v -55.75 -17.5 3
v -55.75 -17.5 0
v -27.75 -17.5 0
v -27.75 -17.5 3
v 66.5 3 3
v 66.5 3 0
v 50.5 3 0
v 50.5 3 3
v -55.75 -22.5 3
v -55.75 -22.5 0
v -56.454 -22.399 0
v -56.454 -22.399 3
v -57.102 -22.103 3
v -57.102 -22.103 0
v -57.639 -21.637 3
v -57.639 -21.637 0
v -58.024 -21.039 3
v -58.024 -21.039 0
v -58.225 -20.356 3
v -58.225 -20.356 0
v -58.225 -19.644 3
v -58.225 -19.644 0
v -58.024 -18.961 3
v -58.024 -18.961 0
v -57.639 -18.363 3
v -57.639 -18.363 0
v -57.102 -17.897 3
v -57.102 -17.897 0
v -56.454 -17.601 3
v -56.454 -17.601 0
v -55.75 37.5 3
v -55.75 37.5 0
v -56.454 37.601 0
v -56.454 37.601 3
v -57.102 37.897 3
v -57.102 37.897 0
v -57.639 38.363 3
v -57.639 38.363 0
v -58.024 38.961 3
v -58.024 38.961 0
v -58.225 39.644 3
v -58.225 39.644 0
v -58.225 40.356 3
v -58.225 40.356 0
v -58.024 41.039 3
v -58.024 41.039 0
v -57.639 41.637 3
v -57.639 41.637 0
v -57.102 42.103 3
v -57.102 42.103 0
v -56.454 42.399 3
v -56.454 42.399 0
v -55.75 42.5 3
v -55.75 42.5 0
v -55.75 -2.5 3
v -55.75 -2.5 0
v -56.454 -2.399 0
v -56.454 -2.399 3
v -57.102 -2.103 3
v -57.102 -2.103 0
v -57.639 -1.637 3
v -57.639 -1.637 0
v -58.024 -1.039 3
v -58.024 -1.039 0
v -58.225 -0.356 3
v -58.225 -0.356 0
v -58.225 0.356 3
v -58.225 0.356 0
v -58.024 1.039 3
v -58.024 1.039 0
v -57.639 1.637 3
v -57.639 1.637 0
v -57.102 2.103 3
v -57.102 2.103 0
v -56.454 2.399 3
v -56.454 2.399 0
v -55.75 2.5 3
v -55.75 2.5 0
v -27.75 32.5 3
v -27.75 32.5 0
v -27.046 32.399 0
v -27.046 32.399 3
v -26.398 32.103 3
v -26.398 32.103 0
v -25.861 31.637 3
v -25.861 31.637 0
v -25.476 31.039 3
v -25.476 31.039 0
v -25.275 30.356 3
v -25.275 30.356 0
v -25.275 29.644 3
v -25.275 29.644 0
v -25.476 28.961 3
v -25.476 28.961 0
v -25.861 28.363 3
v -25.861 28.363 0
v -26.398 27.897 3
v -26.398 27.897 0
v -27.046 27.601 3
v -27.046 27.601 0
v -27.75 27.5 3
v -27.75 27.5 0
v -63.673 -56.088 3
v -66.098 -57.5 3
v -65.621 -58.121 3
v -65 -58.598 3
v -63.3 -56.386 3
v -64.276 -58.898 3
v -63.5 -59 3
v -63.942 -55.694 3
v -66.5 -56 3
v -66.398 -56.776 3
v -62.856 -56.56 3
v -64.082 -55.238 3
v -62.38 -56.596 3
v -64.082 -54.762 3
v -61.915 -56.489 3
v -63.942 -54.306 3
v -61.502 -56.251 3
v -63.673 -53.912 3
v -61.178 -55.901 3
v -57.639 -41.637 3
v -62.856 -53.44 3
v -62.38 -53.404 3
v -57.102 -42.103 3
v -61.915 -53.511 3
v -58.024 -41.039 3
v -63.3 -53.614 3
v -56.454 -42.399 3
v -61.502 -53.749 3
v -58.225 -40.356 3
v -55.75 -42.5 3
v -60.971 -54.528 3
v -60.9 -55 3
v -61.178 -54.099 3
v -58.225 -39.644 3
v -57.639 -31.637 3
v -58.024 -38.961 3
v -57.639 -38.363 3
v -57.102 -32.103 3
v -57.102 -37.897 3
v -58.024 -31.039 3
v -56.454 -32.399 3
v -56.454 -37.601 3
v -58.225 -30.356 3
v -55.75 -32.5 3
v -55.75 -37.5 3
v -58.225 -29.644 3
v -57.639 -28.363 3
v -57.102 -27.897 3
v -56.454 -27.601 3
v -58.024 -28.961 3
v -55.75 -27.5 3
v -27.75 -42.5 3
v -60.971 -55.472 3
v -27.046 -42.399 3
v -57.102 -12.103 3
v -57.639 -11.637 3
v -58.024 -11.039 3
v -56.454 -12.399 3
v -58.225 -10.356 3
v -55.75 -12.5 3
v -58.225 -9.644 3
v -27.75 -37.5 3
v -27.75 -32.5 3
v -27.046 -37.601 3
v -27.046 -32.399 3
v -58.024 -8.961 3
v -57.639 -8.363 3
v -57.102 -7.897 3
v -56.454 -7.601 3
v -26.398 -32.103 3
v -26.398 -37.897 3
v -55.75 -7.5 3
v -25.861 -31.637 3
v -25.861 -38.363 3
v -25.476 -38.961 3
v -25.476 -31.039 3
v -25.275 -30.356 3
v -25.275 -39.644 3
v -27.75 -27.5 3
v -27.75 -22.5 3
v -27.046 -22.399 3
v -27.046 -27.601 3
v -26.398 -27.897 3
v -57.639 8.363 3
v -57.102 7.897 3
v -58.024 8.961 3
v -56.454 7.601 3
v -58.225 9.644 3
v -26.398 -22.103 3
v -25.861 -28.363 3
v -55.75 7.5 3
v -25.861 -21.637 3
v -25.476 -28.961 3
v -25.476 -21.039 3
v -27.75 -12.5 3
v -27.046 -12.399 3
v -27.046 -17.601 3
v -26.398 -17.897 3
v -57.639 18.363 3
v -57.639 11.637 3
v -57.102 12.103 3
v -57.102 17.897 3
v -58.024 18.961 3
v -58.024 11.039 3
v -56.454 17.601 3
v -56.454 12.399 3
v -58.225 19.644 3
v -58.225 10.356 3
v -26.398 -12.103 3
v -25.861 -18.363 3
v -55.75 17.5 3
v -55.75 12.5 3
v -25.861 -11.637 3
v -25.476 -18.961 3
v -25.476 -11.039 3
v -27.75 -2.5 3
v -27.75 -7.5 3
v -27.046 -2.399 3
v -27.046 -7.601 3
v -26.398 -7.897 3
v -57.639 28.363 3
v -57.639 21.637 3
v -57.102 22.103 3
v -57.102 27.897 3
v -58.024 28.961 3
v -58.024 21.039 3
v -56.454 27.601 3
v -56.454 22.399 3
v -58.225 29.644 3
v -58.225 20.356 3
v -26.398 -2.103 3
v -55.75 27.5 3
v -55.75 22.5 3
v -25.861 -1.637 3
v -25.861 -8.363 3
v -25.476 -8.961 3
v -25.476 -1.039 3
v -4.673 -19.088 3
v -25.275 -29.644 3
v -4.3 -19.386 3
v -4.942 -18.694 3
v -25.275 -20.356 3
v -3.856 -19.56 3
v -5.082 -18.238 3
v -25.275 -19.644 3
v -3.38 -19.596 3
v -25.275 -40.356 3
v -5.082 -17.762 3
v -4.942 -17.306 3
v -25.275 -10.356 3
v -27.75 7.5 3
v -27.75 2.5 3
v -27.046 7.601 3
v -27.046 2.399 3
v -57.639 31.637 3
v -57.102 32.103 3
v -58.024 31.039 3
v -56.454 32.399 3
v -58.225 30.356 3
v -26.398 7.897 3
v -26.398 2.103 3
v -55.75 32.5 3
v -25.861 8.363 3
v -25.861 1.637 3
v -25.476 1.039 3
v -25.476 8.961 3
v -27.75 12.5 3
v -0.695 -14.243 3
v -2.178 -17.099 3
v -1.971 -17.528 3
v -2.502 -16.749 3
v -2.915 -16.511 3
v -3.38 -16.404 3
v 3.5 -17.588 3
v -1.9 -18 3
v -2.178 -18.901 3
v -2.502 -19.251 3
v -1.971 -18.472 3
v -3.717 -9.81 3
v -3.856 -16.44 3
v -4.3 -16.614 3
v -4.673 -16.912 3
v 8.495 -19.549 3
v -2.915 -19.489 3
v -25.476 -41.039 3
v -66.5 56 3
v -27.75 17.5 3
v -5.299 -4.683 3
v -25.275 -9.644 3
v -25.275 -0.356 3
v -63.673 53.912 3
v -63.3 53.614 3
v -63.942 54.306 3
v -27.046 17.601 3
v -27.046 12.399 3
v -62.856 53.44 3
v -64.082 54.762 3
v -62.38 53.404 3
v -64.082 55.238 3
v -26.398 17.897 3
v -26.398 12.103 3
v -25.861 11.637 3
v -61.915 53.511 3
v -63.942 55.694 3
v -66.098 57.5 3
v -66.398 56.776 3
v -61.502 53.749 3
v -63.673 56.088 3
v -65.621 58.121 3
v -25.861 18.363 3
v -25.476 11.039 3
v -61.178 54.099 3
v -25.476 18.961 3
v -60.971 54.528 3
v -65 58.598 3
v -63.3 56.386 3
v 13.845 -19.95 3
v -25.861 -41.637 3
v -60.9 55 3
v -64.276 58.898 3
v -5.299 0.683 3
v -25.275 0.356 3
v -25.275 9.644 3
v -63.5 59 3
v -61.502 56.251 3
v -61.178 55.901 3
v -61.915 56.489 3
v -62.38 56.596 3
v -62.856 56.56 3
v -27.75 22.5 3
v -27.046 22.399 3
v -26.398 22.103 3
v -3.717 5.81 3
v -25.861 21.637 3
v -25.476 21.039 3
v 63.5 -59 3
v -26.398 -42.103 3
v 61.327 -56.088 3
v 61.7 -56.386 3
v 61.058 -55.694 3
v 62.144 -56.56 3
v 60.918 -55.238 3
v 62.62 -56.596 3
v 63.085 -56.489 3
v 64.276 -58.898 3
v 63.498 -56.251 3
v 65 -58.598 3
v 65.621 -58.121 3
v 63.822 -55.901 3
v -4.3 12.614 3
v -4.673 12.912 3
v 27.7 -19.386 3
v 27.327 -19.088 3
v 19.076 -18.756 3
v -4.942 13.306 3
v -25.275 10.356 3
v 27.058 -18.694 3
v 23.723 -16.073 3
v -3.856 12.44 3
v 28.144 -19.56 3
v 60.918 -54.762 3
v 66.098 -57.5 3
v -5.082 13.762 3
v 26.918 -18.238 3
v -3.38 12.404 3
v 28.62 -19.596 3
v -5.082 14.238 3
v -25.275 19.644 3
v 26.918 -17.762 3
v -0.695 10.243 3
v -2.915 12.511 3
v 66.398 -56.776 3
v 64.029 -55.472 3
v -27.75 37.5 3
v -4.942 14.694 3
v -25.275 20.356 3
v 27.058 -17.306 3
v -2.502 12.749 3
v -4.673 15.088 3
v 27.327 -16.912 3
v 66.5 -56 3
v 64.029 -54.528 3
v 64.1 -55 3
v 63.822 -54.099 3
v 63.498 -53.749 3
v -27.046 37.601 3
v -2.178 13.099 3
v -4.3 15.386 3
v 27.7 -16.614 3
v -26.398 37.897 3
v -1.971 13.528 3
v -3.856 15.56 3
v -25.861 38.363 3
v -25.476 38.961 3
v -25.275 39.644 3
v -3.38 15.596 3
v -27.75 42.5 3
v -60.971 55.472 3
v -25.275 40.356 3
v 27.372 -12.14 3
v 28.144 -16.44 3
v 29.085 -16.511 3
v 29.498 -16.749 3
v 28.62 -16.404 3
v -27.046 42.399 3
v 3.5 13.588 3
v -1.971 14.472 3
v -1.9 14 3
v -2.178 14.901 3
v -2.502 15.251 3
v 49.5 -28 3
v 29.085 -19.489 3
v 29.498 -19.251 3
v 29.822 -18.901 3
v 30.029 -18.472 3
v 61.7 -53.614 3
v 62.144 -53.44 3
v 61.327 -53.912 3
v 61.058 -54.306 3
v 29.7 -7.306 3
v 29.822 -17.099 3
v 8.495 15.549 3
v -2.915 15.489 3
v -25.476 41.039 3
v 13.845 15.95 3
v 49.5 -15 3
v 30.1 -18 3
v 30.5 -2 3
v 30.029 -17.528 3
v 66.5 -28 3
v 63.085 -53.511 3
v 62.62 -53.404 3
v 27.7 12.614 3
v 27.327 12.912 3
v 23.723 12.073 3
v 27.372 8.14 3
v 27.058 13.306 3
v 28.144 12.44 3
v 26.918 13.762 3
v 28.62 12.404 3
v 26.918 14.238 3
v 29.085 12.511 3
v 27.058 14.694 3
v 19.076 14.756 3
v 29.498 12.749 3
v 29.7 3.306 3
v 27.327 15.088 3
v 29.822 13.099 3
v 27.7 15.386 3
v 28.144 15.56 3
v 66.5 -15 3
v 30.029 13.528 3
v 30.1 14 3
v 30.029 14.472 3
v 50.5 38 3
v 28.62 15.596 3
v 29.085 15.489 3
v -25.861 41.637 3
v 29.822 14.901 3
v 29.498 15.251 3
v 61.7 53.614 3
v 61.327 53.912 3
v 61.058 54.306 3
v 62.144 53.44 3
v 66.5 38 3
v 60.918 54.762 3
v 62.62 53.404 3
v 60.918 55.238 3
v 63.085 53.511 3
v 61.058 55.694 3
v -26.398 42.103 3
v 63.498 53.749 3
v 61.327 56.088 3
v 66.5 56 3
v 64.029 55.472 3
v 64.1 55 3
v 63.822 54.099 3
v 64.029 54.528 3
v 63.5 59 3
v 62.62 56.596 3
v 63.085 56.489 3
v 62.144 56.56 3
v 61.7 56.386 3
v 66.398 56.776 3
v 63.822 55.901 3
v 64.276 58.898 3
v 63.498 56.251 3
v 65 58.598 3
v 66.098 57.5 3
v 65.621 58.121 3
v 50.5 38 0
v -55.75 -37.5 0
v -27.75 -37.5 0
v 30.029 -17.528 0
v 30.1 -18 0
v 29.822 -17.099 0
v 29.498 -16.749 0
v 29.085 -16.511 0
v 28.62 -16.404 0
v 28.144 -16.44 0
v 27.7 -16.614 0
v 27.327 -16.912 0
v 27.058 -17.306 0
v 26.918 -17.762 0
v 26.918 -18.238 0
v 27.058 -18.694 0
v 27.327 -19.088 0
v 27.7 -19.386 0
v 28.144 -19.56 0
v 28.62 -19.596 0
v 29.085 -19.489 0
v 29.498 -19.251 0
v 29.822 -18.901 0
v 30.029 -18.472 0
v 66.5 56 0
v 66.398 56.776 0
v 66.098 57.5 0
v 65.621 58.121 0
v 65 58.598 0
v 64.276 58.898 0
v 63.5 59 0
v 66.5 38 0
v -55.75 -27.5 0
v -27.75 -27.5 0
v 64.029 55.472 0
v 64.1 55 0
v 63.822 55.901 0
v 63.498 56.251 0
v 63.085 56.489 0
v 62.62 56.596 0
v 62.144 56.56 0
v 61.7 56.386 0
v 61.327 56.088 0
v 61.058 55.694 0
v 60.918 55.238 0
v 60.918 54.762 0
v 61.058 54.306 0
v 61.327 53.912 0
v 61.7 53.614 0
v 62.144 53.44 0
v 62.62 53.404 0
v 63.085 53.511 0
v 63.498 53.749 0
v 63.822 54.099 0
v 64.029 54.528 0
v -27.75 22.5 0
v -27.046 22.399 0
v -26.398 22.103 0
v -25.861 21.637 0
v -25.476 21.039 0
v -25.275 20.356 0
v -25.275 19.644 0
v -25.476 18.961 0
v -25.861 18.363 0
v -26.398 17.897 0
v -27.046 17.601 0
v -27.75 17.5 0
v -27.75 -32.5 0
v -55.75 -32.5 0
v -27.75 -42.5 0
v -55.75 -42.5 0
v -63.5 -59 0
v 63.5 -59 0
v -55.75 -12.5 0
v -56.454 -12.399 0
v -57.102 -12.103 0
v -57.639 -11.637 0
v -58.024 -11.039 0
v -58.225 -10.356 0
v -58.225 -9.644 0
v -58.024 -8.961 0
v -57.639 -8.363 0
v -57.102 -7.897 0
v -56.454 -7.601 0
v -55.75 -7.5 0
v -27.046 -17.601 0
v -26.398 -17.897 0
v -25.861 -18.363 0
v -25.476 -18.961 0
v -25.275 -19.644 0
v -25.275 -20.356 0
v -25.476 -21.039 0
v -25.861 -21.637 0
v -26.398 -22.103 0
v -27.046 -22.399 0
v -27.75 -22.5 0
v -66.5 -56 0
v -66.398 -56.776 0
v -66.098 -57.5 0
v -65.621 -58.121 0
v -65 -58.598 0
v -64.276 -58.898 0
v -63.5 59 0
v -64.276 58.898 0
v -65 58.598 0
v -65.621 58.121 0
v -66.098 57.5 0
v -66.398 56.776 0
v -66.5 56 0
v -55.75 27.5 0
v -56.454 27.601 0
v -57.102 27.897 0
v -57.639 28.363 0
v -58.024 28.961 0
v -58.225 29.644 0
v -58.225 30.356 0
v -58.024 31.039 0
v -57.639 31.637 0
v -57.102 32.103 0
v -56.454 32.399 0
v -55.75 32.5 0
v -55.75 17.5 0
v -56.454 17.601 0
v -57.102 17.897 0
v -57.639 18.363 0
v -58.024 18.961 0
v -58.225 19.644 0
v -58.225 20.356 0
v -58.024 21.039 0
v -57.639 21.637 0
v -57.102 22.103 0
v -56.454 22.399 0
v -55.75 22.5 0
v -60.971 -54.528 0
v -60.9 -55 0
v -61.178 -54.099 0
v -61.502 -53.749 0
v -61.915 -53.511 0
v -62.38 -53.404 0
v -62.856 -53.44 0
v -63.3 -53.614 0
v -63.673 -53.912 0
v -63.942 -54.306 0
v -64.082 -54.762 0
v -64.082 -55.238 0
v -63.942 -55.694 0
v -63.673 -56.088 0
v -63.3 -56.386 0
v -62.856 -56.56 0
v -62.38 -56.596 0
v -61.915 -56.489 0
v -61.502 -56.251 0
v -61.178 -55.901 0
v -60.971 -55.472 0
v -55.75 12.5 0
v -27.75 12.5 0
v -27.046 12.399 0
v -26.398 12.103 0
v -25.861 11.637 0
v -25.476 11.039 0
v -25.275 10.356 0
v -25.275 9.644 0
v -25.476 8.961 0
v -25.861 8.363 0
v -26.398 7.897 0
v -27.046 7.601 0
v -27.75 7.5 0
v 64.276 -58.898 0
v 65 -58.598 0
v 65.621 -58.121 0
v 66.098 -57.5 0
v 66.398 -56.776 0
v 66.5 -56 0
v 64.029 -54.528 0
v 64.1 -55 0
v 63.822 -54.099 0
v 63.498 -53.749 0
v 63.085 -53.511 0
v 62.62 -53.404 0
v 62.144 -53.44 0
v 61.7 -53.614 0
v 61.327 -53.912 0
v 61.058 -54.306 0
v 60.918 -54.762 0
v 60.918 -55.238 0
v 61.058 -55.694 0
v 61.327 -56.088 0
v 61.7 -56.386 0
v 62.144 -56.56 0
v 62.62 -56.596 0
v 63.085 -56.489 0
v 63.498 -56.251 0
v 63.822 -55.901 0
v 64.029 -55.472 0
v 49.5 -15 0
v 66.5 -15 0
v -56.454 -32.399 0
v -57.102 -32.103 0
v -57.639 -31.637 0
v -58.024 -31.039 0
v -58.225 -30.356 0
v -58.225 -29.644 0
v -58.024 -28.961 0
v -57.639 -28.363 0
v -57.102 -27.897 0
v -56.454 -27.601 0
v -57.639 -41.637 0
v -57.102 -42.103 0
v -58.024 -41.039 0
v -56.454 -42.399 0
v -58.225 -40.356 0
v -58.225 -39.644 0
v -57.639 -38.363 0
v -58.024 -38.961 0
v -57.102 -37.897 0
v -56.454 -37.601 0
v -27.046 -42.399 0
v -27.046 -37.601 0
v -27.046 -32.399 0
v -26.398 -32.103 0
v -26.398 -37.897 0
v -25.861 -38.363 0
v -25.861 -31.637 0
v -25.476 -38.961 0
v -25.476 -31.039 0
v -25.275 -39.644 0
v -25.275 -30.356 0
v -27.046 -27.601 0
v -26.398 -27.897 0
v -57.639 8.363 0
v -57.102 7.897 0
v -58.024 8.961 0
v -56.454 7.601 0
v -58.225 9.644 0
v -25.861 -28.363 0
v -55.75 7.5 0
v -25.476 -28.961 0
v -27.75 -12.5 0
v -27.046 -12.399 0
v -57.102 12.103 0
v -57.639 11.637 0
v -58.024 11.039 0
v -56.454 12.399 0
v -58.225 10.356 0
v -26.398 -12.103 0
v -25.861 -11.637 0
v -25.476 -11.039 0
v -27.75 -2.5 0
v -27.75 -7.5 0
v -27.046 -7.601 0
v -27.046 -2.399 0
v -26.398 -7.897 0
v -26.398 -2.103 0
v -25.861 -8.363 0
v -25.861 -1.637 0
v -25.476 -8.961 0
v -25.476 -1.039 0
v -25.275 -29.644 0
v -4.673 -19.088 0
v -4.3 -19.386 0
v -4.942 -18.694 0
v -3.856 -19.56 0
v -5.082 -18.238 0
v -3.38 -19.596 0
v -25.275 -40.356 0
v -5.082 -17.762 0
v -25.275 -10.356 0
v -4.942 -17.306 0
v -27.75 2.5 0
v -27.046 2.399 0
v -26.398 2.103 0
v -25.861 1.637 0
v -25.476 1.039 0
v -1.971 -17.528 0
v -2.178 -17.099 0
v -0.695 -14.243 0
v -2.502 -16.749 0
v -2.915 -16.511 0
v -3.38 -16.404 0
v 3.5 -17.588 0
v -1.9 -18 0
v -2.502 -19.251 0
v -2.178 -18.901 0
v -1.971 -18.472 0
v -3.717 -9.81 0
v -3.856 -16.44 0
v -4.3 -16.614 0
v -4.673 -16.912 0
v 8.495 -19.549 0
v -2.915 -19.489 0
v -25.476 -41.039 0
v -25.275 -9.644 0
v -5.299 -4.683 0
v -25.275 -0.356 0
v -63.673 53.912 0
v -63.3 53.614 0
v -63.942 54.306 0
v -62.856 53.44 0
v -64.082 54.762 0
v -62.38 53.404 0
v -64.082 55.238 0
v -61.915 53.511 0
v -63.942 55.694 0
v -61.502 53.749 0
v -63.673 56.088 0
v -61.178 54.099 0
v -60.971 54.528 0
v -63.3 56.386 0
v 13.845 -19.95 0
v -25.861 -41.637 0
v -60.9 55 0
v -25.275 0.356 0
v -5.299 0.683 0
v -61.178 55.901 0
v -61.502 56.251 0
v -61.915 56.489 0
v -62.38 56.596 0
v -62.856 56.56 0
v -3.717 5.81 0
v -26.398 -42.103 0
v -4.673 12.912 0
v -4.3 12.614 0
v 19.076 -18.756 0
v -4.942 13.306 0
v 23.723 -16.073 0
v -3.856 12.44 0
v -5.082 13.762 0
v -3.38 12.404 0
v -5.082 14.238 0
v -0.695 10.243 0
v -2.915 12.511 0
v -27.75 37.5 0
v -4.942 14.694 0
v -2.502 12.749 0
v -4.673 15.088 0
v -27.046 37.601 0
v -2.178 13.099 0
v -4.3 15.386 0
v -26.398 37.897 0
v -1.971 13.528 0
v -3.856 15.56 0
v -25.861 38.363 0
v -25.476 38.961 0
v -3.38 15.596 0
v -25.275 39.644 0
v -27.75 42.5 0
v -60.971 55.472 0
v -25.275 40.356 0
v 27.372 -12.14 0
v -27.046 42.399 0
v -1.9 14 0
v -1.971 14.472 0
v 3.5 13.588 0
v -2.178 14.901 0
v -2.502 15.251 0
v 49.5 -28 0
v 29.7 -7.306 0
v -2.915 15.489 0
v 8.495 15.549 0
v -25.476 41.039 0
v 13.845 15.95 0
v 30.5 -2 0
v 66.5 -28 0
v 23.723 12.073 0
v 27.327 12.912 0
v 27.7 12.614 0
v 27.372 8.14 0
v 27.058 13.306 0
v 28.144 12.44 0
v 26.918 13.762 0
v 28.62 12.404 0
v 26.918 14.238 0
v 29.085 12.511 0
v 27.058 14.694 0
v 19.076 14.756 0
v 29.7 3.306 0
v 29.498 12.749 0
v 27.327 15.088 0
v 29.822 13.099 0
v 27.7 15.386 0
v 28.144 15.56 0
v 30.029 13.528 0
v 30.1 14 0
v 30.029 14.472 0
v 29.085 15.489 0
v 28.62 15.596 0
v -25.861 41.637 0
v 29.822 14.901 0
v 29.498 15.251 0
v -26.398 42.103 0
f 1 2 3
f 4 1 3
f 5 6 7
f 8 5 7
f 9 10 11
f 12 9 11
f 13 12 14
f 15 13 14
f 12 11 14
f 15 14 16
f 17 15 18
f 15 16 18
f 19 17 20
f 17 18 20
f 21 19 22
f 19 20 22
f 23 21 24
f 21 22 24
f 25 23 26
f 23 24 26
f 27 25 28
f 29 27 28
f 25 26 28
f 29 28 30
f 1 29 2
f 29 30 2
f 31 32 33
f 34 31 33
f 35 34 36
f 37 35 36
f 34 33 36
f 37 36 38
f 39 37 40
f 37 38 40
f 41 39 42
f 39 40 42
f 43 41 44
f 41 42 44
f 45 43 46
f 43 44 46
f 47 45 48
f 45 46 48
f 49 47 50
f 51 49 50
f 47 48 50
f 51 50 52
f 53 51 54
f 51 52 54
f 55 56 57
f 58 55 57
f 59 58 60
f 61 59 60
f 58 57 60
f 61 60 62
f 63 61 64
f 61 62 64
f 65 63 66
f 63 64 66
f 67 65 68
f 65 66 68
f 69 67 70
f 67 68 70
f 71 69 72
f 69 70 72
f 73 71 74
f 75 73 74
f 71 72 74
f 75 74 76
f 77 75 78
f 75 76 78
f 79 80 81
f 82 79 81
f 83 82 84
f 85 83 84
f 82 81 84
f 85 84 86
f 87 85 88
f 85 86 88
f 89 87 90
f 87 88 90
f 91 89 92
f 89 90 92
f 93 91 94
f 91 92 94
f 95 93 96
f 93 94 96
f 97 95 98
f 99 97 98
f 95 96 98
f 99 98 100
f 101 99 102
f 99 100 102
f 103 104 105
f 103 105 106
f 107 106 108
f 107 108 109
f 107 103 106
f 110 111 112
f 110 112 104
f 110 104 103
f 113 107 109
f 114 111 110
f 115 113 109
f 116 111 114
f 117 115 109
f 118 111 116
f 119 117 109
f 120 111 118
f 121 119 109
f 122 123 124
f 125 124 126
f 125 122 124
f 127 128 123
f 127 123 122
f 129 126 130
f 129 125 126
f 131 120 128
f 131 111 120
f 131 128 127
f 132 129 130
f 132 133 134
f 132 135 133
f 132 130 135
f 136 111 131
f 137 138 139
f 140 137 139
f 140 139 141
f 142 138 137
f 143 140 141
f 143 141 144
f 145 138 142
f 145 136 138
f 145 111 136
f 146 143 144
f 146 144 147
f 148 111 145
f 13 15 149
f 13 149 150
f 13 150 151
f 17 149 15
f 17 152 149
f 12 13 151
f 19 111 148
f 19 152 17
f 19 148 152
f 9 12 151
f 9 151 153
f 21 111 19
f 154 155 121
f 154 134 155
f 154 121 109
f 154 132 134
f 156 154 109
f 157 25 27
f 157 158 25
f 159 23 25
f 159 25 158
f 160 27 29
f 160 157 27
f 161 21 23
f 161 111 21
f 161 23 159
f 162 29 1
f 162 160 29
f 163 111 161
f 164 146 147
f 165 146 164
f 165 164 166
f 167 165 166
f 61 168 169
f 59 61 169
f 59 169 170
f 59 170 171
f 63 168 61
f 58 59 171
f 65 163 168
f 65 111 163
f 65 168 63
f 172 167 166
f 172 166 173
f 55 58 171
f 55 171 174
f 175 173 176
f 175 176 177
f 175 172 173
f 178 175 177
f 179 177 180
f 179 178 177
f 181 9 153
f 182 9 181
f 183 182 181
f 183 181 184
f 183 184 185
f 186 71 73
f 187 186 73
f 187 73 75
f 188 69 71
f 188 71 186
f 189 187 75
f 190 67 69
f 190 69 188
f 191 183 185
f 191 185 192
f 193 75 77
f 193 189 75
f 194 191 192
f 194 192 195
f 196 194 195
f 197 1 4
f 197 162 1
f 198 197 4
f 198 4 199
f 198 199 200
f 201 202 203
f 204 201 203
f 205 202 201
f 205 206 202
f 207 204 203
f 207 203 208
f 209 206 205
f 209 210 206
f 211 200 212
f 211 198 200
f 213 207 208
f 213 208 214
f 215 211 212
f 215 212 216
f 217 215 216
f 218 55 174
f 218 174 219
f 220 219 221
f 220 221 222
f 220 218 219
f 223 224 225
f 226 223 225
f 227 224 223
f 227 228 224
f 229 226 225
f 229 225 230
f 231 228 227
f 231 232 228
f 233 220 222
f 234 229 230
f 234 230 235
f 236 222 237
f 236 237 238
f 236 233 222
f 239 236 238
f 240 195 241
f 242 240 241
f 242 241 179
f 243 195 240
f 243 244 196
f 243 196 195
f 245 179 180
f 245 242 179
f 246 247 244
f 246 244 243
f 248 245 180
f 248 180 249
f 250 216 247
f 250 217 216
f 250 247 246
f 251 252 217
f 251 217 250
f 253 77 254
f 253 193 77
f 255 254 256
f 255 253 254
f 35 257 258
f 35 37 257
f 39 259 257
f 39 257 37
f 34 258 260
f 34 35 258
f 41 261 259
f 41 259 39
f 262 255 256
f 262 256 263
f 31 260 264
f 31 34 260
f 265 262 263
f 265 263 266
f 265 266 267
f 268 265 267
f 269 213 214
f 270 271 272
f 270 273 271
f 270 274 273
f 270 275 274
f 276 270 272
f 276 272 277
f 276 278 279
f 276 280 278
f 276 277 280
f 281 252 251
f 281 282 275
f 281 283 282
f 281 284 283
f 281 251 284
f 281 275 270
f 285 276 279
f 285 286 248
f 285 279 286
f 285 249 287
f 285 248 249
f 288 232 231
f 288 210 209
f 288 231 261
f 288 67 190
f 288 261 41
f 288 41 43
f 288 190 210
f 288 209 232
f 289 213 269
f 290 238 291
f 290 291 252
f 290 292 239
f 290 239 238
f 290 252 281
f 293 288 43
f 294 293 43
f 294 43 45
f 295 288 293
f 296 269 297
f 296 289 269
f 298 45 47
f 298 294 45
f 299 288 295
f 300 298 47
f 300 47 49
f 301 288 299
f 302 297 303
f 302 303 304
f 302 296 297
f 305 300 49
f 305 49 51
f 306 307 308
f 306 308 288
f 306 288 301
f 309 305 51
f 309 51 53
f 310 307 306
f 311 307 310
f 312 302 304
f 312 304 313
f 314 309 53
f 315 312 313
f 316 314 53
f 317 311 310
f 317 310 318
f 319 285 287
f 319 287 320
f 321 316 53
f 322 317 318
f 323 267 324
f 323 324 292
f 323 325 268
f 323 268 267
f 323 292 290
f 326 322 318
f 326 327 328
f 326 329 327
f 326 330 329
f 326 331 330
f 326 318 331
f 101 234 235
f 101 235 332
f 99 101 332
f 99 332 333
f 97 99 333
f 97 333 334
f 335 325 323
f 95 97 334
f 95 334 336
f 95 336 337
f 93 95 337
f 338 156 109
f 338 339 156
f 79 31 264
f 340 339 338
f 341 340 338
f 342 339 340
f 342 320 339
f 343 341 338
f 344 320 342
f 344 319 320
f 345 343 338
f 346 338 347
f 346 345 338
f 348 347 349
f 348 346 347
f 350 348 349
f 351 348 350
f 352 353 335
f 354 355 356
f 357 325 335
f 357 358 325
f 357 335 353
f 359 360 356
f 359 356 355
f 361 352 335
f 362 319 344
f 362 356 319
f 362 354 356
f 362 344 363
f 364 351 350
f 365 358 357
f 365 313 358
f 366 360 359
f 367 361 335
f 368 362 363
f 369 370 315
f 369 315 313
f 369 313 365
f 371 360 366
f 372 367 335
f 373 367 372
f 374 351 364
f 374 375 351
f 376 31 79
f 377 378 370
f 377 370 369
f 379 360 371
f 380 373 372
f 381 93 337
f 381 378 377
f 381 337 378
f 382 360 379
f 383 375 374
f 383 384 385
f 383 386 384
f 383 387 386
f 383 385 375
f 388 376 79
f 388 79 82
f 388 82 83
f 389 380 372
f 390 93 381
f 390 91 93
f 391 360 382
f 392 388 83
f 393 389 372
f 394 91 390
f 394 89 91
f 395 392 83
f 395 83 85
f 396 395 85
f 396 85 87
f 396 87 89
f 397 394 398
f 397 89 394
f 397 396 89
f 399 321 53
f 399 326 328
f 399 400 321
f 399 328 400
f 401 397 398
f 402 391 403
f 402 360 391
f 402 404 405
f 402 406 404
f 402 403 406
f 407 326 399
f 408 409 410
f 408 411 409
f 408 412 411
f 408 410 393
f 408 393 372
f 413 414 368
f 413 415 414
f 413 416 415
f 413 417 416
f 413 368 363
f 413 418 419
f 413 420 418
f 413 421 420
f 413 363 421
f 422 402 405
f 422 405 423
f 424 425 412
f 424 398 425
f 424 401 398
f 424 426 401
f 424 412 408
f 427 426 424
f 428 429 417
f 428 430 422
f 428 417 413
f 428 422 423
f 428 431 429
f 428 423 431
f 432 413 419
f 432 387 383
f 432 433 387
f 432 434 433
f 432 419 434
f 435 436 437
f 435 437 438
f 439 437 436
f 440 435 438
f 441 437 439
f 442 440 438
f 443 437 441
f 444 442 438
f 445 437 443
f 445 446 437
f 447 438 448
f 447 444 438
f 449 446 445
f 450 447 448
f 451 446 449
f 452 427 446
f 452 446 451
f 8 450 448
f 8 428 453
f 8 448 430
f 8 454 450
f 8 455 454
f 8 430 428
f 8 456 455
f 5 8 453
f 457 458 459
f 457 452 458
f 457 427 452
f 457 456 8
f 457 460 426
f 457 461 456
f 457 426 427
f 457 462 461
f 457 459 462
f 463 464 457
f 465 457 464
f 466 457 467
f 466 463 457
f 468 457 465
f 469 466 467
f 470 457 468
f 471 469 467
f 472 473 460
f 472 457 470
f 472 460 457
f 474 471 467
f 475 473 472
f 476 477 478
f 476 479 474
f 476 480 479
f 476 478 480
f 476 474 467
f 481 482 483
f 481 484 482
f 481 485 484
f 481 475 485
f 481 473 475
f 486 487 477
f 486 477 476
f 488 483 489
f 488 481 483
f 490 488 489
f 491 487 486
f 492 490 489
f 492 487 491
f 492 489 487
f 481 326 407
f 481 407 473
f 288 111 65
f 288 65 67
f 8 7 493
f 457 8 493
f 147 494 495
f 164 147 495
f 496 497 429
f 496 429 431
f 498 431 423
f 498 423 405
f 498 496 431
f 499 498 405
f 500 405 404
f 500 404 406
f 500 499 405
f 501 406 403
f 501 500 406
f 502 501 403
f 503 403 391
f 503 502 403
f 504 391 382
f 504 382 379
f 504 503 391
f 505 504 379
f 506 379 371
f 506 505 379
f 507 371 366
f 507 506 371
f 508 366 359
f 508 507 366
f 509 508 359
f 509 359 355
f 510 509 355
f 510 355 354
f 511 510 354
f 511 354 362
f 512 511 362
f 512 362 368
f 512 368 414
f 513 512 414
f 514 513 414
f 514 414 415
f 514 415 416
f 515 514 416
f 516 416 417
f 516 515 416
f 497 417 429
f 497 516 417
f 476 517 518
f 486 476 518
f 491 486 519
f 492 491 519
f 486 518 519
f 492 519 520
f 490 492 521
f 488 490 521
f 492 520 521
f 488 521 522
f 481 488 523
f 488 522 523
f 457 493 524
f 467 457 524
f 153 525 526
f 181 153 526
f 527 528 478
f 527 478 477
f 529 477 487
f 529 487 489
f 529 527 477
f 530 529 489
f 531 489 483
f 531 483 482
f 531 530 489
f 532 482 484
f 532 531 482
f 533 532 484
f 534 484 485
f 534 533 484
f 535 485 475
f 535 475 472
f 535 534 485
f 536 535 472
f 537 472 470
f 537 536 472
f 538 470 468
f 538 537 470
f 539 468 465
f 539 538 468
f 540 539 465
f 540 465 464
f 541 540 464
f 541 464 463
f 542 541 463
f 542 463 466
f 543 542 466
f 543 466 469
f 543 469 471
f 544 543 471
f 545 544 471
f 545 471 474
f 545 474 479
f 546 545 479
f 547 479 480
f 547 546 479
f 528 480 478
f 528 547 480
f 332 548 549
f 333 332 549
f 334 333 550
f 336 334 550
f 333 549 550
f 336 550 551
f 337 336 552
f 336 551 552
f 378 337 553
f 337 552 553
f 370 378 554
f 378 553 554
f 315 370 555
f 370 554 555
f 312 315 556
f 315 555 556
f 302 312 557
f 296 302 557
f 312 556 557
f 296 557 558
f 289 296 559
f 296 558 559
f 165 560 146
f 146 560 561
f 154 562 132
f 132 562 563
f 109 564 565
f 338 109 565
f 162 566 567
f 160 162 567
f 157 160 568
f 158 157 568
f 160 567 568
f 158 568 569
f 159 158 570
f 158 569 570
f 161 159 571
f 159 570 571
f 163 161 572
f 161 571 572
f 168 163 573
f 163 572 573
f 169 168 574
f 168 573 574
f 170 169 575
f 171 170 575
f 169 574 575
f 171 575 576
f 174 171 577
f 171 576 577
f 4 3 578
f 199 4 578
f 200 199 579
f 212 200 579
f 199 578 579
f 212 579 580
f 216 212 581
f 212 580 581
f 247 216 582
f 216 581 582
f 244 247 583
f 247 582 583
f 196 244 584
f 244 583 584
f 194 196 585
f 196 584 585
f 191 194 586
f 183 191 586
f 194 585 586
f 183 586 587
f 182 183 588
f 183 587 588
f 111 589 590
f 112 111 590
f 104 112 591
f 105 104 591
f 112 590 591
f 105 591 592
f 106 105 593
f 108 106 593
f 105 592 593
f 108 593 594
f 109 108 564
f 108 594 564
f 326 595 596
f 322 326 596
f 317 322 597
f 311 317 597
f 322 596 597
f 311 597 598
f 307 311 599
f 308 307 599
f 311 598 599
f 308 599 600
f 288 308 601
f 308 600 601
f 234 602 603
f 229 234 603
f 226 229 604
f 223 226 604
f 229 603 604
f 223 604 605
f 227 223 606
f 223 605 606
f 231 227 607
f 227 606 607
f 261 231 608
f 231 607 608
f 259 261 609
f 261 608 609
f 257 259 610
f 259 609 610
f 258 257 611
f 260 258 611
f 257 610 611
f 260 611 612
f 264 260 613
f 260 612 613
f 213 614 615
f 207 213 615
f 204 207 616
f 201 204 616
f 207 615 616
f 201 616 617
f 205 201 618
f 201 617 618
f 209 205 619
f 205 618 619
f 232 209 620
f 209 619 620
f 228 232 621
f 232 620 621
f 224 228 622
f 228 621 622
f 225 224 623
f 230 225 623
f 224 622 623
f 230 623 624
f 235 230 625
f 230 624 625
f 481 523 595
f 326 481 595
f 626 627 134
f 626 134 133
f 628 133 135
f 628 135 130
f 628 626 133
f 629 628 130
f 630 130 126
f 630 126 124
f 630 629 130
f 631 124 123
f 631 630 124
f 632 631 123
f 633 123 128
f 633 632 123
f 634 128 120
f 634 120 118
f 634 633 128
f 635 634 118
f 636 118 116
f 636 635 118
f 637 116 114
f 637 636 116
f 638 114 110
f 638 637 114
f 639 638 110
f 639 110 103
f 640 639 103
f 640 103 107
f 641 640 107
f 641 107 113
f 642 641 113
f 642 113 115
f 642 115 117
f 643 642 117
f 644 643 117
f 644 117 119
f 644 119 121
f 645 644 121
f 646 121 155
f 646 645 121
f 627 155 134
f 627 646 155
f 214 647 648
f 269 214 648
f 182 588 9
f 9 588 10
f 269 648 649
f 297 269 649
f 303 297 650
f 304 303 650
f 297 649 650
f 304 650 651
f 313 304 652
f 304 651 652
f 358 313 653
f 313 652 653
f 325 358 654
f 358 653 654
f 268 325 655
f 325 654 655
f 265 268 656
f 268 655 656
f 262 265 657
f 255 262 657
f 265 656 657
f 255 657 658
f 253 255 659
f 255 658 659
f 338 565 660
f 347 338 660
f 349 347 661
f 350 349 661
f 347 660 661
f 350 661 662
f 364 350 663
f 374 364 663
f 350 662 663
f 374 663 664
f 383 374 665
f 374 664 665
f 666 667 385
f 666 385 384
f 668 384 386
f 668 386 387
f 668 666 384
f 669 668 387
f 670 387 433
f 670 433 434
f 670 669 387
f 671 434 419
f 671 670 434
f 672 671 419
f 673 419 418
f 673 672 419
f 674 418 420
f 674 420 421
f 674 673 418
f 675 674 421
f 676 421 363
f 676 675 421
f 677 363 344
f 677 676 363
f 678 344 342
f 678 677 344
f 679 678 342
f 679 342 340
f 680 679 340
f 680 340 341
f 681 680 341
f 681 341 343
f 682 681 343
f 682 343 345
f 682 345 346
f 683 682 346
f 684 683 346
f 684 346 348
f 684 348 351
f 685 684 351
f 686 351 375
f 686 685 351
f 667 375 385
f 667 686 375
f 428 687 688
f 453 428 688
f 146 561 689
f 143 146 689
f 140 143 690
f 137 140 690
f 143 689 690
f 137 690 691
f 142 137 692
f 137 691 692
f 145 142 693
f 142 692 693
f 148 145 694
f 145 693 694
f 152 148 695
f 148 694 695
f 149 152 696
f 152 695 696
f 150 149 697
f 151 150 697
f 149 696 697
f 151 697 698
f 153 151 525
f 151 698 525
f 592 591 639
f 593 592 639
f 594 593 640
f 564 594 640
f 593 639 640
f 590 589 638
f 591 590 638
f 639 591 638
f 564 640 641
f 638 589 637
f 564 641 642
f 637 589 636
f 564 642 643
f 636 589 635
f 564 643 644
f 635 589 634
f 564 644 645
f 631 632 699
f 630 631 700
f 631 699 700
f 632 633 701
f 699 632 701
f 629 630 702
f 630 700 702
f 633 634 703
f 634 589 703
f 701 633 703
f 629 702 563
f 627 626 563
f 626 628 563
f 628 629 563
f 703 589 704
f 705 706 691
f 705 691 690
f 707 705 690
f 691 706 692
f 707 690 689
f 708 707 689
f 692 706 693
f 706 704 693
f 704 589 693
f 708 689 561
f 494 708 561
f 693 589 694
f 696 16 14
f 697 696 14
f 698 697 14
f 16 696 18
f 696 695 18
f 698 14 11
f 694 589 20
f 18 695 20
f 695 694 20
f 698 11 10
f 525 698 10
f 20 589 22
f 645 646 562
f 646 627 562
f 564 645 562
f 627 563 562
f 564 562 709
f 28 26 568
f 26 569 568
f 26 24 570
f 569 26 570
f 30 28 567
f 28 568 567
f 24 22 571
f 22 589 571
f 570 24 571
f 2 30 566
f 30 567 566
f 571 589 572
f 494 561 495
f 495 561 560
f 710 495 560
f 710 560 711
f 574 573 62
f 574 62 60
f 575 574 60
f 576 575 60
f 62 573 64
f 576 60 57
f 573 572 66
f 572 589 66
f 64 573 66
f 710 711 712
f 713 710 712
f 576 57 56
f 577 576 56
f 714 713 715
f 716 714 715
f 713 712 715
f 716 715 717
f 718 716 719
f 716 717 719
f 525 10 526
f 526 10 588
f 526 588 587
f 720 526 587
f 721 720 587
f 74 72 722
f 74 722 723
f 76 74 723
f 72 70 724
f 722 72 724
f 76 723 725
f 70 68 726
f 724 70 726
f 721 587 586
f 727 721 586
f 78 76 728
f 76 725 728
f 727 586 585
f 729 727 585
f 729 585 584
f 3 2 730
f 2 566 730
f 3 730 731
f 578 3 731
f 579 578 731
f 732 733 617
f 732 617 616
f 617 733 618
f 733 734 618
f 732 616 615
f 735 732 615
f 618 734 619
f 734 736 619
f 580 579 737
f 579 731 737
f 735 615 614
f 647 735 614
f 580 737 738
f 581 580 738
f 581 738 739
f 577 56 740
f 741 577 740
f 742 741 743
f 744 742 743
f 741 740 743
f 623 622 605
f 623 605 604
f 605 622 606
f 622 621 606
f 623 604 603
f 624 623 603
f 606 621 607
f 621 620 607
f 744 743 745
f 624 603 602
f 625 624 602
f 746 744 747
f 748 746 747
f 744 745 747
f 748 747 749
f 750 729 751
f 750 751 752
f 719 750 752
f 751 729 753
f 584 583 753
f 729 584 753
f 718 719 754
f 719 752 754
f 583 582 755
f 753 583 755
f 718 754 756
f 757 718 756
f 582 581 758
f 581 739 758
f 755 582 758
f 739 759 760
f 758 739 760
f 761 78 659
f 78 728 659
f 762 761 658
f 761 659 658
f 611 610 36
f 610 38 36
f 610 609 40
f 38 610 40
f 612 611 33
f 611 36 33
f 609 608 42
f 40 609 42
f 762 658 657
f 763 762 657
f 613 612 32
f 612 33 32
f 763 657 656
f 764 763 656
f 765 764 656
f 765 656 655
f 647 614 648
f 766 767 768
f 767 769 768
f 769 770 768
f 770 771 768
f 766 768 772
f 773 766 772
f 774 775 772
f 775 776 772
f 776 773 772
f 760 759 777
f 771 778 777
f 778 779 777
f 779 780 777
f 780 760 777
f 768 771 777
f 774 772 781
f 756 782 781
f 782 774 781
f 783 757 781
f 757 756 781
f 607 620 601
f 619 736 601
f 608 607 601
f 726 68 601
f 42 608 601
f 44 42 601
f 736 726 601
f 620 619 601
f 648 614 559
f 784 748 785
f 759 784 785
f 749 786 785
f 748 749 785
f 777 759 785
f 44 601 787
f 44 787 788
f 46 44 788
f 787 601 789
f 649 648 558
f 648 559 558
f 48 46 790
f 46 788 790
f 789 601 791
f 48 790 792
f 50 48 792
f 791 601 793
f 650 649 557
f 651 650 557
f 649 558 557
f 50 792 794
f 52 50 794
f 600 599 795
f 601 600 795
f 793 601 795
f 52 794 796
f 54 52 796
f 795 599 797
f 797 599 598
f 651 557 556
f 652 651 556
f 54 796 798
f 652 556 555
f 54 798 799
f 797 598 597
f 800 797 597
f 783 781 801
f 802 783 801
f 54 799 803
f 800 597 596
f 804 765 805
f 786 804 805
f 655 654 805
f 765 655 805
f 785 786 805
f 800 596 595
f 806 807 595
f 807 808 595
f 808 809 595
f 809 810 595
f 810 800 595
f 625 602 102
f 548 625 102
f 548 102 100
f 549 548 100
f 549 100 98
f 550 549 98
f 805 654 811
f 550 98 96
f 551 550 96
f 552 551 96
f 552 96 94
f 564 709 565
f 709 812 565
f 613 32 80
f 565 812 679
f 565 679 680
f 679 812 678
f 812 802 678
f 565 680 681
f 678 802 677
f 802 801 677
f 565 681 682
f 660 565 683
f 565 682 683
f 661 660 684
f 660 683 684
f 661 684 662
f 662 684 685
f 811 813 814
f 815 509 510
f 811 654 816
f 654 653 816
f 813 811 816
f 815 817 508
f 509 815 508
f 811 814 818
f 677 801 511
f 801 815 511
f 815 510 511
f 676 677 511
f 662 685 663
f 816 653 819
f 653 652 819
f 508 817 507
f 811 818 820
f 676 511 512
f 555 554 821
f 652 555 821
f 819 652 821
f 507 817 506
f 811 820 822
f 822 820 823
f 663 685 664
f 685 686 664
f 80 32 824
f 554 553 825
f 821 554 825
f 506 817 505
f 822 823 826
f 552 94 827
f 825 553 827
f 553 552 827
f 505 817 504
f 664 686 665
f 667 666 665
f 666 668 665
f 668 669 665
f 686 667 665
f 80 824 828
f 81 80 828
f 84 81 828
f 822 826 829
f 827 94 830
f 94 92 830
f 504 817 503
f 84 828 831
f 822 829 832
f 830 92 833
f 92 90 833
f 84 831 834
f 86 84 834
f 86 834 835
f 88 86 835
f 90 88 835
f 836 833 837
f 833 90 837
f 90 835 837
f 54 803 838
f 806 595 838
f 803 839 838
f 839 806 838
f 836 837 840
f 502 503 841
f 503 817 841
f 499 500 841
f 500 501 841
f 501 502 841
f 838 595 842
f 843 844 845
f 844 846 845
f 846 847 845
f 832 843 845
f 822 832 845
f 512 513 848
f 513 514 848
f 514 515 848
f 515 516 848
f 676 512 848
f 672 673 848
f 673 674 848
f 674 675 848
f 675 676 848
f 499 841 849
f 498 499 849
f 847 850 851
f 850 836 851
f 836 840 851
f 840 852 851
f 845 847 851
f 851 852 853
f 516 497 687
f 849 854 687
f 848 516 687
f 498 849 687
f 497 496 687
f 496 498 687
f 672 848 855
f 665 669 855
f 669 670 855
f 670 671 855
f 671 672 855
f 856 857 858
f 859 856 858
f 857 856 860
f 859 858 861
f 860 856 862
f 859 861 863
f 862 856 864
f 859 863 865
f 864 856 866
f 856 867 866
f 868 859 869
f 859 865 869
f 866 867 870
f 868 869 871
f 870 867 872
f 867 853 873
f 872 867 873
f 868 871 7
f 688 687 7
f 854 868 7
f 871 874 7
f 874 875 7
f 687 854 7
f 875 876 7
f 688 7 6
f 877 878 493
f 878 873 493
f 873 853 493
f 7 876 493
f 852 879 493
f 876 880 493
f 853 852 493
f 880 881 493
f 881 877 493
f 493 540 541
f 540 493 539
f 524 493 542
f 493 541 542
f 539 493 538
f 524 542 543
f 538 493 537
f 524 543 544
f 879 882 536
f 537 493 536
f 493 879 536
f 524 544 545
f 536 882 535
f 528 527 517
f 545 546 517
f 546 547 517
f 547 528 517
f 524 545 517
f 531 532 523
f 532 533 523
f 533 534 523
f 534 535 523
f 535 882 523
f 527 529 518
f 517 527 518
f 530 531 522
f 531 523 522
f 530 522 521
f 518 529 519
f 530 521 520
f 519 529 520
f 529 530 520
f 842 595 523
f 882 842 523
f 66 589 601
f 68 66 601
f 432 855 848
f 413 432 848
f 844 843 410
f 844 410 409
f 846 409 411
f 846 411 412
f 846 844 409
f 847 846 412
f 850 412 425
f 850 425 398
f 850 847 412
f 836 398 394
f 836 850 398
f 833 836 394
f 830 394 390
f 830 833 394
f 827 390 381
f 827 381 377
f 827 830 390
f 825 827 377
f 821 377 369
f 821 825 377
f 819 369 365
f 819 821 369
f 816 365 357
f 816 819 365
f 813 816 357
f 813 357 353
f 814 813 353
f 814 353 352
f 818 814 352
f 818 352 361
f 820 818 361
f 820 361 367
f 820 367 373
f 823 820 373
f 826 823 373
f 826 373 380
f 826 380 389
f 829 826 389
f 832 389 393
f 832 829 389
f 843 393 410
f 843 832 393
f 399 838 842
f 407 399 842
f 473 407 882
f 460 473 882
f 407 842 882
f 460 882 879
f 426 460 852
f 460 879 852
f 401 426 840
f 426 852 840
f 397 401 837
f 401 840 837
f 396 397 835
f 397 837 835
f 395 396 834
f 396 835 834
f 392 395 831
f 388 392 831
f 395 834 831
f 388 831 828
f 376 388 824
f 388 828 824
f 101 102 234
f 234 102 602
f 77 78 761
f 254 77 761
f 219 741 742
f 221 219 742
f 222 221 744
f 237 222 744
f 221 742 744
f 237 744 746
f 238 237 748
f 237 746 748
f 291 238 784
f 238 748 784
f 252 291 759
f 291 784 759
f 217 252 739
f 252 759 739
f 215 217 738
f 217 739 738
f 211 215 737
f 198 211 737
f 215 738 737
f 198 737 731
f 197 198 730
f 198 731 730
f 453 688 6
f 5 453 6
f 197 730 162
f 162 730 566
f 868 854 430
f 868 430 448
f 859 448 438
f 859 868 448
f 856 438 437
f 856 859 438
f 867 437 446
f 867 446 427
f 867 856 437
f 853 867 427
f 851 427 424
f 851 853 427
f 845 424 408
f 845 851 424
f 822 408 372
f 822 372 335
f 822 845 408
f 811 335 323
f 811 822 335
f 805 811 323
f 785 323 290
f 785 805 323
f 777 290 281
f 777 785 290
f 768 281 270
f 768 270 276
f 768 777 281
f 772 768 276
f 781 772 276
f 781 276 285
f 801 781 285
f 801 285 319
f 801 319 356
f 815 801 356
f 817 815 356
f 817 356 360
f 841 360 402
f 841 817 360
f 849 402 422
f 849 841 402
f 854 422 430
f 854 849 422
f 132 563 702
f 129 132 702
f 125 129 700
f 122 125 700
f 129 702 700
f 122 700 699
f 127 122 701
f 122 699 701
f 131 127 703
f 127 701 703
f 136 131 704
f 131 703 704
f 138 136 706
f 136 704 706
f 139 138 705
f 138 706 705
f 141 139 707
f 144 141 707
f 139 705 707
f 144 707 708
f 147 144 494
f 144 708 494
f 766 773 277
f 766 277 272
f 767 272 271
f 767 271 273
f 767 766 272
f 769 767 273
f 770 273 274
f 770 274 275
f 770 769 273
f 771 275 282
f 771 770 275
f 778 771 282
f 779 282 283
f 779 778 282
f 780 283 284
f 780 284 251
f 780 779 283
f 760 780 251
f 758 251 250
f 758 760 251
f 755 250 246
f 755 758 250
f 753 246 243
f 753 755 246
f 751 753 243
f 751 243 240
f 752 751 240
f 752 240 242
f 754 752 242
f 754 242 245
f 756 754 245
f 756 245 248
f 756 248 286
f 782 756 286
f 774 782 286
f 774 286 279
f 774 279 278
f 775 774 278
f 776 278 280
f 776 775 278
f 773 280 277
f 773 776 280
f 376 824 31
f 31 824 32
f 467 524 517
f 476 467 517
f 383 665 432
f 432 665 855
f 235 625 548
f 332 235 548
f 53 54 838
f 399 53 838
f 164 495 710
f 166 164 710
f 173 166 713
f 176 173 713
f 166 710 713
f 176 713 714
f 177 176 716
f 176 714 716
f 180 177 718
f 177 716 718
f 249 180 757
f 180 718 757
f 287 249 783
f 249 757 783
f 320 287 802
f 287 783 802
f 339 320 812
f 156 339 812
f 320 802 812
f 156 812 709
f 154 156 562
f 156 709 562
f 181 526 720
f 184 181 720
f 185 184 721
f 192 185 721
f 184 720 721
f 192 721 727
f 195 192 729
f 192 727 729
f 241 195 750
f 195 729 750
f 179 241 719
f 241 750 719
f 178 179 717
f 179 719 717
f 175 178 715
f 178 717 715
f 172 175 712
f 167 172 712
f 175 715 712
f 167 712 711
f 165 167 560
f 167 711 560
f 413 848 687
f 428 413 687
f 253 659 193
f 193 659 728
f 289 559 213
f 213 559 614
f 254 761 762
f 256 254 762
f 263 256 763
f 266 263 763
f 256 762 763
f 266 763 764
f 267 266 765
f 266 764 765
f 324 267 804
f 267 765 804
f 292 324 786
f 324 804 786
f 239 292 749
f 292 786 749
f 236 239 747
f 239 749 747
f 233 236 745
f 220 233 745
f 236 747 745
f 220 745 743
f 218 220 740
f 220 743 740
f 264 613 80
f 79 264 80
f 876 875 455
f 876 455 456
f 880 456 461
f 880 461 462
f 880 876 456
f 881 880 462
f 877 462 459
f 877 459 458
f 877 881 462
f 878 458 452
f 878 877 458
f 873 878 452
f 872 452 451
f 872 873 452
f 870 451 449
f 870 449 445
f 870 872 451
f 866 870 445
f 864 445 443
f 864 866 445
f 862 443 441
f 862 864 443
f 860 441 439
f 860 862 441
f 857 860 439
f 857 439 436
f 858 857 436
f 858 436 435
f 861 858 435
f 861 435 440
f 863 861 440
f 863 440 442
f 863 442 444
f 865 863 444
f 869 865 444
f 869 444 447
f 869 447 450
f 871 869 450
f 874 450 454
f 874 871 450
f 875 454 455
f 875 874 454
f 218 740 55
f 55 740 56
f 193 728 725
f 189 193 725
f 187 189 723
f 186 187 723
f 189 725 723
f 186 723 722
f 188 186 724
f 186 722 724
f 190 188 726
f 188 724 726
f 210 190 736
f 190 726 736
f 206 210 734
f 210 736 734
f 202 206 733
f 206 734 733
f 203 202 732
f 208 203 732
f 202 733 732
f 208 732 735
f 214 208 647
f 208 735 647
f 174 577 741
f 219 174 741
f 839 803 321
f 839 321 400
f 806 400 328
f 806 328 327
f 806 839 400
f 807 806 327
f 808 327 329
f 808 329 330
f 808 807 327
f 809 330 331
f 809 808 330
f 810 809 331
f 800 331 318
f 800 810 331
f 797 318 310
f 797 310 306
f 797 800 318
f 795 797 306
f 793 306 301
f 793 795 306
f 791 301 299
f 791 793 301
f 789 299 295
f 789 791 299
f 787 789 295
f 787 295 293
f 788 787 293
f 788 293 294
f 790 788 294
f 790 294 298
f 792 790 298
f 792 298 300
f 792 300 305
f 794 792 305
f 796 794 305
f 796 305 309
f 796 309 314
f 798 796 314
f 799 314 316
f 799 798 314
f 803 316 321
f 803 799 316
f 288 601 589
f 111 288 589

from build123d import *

# Parameters (mm, degrees)
SKETCH1_R           = 18
SKETCH1_R_2         = 1.6
BOSS_EXTRUDE1_DEPTH = 3


with BuildPart() as part:
    # Sketch1 → Boss-Extrude1 (new body)
    with BuildSketch(Plane.XY):
        with BuildLine():
            Line((-63.5, -59), (63.5, -59))
            ThreePointArc((63.5, -59), (65.621320344, -58.121320344), (66.5, -56))
            Line((66.5, -56), (66.5, -28))
            Line((66.5, -28), (49.5, -28))
            Line((49.5, -28), (49.5, -15))
            Line((49.5, -15), (66.5, -15))
            Line((66.5, -15), (66.5, 3))
            Line((66.5, 3), (50.5, 3))
            Line((50.5, 3), (50.5, 38))
            Line((50.5, 38), (66.5, 38))
            Line((66.5, 38), (66.5, 56))
            ThreePointArc((66.5, 56), (65.621320344, 58.121320344), (63.5, 59))
            Line((63.5, 59), (-63.5, 59))
            ThreePointArc((-63.5, 59), (-65.621320344, 58.121320344), (-66.5, 56))
            Line((-66.5, 56), (-66.5, -56))
            ThreePointArc((-66.5, -56), (-65.621320344, -58.121320344), (-63.5, -59))
        make_face()
        with Locations((12.5, -2)):
            Circle(SKETCH1_R, mode=Mode.SUBTRACT)
        with Locations((-3.5, 14)):
            Circle(SKETCH1_R_2, mode=Mode.SUBTRACT)
        with Locations((28.5, 14)):
            Circle(SKETCH1_R_2, mode=Mode.SUBTRACT)
        with Locations((28.5, -18)):
            Circle(SKETCH1_R_2, mode=Mode.SUBTRACT)
        with Locations((-3.5, -18)):
            Circle(SKETCH1_R_2, mode=Mode.SUBTRACT)
        with Locations((-62.5, 55)):
            Circle(SKETCH1_R_2, mode=Mode.SUBTRACT)
        with Locations((62.5, 55)):
            Circle(SKETCH1_R_2, mode=Mode.SUBTRACT)
        with Locations((-62.5, -55)):
            Circle(SKETCH1_R_2, mode=Mode.SUBTRACT)
        with Locations((62.5, -55)):
            Circle(SKETCH1_R_2, mode=Mode.SUBTRACT)
        with BuildLine():
            Line((-55.75, 2.5), (-27.75, 2.5))
            ThreePointArc((-27.75, 2.5), (-25.25, 0), (-27.75, -2.5))
            Line((-27.75, -2.5), (-55.75, -2.5))
            ThreePointArc((-55.75, -2.5), (-58.25, 0), (-55.75, 2.5))
        make_face(mode=Mode.SUBTRACT)
        with BuildLine():
            Line((-55.75, 12.5), (-27.75, 12.5))
            ThreePointArc((-27.75, 12.5), (-25.25, 10), (-27.75, 7.5))
            Line((-27.75, 7.5), (-55.75, 7.5))
            ThreePointArc((-55.75, 7.5), (-58.25, 10), (-55.75, 12.5))
        make_face(mode=Mode.SUBTRACT)
        with BuildLine():
            Line((-55.75, 22.5), (-27.75, 22.5))
            ThreePointArc((-27.75, 22.5), (-25.25, 20), (-27.75, 17.5))
            Line((-27.75, 17.5), (-55.75, 17.5))
            ThreePointArc((-55.75, 17.5), (-58.25, 20), (-55.75, 22.5))
        make_face(mode=Mode.SUBTRACT)
        with BuildLine():
            Line((-55.75, 32.5), (-27.75, 32.5))
            ThreePointArc((-27.75, 32.5), (-25.25, 30), (-27.75, 27.5))
            Line((-27.75, 27.5), (-55.75, 27.5))
            ThreePointArc((-55.75, 27.5), (-58.25, 30), (-55.75, 32.5))
        make_face(mode=Mode.SUBTRACT)
        with BuildLine():
            Line((-55.75, 42.5), (-27.75, 42.5))
            ThreePointArc((-27.75, 42.5), (-25.25, 40), (-27.75, 37.5))
            Line((-27.75, 37.5), (-55.75, 37.5))
            ThreePointArc((-55.75, 37.5), (-58.25, 40), (-55.75, 42.5))
        make_face(mode=Mode.SUBTRACT)
        with BuildLine():
            Line((-55.75, -37.5), (-27.75, -37.5))
            ThreePointArc((-27.75, -37.5), (-25.25, -40), (-27.75, -42.5))
            Line((-27.75, -42.5), (-55.75, -42.5))
            ThreePointArc((-55.75, -42.5), (-58.25, -40), (-55.75, -37.5))
        make_face(mode=Mode.SUBTRACT)
        with BuildLine():
            Line((-55.75, -27.5), (-27.75, -27.5))
            ThreePointArc((-27.75, -27.5), (-25.25, -30), (-27.75, -32.5))
            Line((-27.75, -32.5), (-55.75, -32.5))
            ThreePointArc((-55.75, -32.5), (-58.25, -30), (-55.75, -27.5))
        make_face(mode=Mode.SUBTRACT)
        with BuildLine():
            Line((-55.75, -17.5), (-27.75, -17.5))
            ThreePointArc((-27.75, -17.5), (-25.25, -20), (-27.75, -22.5))
            Line((-27.75, -22.5), (-55.75, -22.5))
            ThreePointArc((-55.75, -22.5), (-58.25, -20), (-55.75, -17.5))
        make_face(mode=Mode.SUBTRACT)
        with BuildLine():
            Line((-55.75, -7.5), (-27.75, -7.5))
            ThreePointArc((-27.75, -7.5), (-25.25, -10), (-27.75, -12.5))
            Line((-27.75, -12.5), (-55.75, -12.5))
            ThreePointArc((-55.75, -12.5), (-58.25, -10), (-55.75, -7.5))
        make_face(mode=Mode.SUBTRACT)
    extrude(amount=BOSS_EXTRUDE1_DEPTH)


solid = part.part
